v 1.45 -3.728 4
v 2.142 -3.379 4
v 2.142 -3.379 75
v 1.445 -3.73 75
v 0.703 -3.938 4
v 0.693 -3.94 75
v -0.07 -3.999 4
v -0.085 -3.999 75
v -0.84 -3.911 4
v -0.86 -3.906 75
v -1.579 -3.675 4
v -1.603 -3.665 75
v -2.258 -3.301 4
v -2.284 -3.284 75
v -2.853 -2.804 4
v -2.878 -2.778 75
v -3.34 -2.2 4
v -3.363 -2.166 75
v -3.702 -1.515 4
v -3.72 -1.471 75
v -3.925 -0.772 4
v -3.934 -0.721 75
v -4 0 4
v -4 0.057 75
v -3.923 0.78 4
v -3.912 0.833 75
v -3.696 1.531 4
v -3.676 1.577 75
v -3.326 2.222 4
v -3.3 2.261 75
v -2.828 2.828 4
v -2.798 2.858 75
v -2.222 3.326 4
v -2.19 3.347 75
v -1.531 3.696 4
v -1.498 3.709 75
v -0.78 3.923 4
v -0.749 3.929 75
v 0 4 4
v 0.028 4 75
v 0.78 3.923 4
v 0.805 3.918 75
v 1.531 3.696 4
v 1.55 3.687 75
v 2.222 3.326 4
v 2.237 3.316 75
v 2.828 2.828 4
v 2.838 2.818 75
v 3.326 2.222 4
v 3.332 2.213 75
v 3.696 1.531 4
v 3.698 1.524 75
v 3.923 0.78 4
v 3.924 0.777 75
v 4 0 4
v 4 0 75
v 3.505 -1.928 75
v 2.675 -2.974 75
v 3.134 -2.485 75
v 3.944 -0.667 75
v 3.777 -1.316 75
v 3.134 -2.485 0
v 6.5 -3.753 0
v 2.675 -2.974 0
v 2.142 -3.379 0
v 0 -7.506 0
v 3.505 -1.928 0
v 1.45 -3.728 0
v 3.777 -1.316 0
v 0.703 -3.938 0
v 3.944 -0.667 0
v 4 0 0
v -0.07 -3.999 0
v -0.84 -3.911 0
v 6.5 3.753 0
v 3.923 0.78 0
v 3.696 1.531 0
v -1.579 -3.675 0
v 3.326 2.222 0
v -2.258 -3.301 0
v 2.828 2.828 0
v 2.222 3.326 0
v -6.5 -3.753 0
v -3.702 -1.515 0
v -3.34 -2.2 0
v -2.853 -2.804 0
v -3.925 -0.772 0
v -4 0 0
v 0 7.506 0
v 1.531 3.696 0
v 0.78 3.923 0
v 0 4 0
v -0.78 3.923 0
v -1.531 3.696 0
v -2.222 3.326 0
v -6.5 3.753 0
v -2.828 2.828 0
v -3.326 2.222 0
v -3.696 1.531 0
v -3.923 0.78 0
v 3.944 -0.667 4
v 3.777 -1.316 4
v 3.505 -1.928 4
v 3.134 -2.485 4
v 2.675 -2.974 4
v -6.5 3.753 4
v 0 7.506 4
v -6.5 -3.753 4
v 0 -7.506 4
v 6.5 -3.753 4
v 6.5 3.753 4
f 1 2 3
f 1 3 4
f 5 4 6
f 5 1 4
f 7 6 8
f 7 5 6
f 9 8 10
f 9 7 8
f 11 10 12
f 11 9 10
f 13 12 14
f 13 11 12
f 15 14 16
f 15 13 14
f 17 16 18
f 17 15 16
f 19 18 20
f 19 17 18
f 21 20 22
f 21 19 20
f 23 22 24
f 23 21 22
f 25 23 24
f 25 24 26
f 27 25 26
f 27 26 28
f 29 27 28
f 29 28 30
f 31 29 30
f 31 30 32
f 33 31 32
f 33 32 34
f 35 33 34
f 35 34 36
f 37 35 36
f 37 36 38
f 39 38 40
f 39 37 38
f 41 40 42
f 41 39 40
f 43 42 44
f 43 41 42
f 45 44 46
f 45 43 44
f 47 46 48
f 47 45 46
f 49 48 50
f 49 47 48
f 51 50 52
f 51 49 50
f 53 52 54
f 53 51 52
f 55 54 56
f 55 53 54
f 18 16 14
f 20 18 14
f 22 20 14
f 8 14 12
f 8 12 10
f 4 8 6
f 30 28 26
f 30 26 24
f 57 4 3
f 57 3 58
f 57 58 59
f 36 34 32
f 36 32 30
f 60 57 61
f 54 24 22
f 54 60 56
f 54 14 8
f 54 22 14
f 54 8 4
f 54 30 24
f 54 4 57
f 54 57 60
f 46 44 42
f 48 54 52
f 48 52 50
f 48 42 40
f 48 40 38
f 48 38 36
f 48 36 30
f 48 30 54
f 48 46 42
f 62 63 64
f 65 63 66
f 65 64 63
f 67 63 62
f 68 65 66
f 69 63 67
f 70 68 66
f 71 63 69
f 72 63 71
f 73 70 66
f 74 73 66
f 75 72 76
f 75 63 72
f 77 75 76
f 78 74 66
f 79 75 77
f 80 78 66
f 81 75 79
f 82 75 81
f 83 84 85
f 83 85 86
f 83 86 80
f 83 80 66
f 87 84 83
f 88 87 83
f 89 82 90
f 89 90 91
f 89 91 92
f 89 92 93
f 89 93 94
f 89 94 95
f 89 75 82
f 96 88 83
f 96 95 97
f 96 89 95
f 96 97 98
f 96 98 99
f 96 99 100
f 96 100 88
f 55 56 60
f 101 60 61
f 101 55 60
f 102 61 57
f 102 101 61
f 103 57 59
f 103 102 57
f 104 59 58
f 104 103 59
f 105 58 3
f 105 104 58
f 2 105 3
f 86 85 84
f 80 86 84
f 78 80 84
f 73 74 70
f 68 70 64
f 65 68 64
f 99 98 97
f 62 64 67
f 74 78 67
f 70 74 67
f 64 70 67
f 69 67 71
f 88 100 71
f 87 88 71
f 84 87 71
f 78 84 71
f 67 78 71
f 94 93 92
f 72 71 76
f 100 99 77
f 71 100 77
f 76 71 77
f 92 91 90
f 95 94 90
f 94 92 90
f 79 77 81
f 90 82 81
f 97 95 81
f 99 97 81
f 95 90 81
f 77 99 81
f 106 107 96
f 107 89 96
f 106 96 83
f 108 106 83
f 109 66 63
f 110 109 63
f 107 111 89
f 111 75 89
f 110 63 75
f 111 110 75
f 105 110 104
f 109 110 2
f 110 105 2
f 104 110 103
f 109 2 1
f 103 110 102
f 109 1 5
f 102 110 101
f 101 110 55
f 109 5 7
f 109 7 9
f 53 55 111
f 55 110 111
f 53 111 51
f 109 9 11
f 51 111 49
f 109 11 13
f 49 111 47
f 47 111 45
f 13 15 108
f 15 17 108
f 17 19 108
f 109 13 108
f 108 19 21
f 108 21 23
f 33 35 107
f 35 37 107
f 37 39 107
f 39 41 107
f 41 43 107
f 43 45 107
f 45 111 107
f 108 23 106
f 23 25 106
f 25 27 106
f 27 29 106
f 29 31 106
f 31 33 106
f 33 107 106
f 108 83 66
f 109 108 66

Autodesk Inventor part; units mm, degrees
ref_plane "YZ Plane" through (0, 0, 0) normal (1, 0, 0) x (0, 1, 0)
ref_plane "XZ Plane" through (0, 0, 0) normal (0, 1, 0) x (-1, 0, 0)
ref_plane "XY Plane" through (0, 0, 0) normal (0, 0, 1) x (1, 0, 0)
sketch "Sketch1" plane through (0, 0, 0) normal (0, 0, 1) x (1, 0, 0)
  circle A0 centre (0, 0) radius 4
  line L0 (2.1406, -3.379) -> (2.1439, -3.379)
  point P0 (-2.1406, -3.379)
  dimension "d0" = 8
extrude "Extrusion1" add sketch "Sketch1" along normal blind 75
sketch "Sketch2" plane through (0, 0, 0) normal (0, 0, -1) x (-1, 0, 0)
  circle A0 centre (0, 0) radius 4 projected
  line L0 (0, -7.5056) -> (-6.5, -3.7528)
  line L1 (-6.5, -3.7528) -> (-6.5, 3.7528)
  line L2 (-6.5, 3.7528) -> (0, 7.5056)
  line L3 (0, 7.5056) -> (6.5, 3.7528)
  line L4 (6.5, 3.7528) -> (6.5, -3.7528)
  line L5 (6.5, -3.7528) -> (0, -7.5056)
  dimension "d4" = 13
extrude "Extrusion2" add sketch "Sketch2" against normal blind 4
properties part number "8mm-rod" material "Iron, Cast"
